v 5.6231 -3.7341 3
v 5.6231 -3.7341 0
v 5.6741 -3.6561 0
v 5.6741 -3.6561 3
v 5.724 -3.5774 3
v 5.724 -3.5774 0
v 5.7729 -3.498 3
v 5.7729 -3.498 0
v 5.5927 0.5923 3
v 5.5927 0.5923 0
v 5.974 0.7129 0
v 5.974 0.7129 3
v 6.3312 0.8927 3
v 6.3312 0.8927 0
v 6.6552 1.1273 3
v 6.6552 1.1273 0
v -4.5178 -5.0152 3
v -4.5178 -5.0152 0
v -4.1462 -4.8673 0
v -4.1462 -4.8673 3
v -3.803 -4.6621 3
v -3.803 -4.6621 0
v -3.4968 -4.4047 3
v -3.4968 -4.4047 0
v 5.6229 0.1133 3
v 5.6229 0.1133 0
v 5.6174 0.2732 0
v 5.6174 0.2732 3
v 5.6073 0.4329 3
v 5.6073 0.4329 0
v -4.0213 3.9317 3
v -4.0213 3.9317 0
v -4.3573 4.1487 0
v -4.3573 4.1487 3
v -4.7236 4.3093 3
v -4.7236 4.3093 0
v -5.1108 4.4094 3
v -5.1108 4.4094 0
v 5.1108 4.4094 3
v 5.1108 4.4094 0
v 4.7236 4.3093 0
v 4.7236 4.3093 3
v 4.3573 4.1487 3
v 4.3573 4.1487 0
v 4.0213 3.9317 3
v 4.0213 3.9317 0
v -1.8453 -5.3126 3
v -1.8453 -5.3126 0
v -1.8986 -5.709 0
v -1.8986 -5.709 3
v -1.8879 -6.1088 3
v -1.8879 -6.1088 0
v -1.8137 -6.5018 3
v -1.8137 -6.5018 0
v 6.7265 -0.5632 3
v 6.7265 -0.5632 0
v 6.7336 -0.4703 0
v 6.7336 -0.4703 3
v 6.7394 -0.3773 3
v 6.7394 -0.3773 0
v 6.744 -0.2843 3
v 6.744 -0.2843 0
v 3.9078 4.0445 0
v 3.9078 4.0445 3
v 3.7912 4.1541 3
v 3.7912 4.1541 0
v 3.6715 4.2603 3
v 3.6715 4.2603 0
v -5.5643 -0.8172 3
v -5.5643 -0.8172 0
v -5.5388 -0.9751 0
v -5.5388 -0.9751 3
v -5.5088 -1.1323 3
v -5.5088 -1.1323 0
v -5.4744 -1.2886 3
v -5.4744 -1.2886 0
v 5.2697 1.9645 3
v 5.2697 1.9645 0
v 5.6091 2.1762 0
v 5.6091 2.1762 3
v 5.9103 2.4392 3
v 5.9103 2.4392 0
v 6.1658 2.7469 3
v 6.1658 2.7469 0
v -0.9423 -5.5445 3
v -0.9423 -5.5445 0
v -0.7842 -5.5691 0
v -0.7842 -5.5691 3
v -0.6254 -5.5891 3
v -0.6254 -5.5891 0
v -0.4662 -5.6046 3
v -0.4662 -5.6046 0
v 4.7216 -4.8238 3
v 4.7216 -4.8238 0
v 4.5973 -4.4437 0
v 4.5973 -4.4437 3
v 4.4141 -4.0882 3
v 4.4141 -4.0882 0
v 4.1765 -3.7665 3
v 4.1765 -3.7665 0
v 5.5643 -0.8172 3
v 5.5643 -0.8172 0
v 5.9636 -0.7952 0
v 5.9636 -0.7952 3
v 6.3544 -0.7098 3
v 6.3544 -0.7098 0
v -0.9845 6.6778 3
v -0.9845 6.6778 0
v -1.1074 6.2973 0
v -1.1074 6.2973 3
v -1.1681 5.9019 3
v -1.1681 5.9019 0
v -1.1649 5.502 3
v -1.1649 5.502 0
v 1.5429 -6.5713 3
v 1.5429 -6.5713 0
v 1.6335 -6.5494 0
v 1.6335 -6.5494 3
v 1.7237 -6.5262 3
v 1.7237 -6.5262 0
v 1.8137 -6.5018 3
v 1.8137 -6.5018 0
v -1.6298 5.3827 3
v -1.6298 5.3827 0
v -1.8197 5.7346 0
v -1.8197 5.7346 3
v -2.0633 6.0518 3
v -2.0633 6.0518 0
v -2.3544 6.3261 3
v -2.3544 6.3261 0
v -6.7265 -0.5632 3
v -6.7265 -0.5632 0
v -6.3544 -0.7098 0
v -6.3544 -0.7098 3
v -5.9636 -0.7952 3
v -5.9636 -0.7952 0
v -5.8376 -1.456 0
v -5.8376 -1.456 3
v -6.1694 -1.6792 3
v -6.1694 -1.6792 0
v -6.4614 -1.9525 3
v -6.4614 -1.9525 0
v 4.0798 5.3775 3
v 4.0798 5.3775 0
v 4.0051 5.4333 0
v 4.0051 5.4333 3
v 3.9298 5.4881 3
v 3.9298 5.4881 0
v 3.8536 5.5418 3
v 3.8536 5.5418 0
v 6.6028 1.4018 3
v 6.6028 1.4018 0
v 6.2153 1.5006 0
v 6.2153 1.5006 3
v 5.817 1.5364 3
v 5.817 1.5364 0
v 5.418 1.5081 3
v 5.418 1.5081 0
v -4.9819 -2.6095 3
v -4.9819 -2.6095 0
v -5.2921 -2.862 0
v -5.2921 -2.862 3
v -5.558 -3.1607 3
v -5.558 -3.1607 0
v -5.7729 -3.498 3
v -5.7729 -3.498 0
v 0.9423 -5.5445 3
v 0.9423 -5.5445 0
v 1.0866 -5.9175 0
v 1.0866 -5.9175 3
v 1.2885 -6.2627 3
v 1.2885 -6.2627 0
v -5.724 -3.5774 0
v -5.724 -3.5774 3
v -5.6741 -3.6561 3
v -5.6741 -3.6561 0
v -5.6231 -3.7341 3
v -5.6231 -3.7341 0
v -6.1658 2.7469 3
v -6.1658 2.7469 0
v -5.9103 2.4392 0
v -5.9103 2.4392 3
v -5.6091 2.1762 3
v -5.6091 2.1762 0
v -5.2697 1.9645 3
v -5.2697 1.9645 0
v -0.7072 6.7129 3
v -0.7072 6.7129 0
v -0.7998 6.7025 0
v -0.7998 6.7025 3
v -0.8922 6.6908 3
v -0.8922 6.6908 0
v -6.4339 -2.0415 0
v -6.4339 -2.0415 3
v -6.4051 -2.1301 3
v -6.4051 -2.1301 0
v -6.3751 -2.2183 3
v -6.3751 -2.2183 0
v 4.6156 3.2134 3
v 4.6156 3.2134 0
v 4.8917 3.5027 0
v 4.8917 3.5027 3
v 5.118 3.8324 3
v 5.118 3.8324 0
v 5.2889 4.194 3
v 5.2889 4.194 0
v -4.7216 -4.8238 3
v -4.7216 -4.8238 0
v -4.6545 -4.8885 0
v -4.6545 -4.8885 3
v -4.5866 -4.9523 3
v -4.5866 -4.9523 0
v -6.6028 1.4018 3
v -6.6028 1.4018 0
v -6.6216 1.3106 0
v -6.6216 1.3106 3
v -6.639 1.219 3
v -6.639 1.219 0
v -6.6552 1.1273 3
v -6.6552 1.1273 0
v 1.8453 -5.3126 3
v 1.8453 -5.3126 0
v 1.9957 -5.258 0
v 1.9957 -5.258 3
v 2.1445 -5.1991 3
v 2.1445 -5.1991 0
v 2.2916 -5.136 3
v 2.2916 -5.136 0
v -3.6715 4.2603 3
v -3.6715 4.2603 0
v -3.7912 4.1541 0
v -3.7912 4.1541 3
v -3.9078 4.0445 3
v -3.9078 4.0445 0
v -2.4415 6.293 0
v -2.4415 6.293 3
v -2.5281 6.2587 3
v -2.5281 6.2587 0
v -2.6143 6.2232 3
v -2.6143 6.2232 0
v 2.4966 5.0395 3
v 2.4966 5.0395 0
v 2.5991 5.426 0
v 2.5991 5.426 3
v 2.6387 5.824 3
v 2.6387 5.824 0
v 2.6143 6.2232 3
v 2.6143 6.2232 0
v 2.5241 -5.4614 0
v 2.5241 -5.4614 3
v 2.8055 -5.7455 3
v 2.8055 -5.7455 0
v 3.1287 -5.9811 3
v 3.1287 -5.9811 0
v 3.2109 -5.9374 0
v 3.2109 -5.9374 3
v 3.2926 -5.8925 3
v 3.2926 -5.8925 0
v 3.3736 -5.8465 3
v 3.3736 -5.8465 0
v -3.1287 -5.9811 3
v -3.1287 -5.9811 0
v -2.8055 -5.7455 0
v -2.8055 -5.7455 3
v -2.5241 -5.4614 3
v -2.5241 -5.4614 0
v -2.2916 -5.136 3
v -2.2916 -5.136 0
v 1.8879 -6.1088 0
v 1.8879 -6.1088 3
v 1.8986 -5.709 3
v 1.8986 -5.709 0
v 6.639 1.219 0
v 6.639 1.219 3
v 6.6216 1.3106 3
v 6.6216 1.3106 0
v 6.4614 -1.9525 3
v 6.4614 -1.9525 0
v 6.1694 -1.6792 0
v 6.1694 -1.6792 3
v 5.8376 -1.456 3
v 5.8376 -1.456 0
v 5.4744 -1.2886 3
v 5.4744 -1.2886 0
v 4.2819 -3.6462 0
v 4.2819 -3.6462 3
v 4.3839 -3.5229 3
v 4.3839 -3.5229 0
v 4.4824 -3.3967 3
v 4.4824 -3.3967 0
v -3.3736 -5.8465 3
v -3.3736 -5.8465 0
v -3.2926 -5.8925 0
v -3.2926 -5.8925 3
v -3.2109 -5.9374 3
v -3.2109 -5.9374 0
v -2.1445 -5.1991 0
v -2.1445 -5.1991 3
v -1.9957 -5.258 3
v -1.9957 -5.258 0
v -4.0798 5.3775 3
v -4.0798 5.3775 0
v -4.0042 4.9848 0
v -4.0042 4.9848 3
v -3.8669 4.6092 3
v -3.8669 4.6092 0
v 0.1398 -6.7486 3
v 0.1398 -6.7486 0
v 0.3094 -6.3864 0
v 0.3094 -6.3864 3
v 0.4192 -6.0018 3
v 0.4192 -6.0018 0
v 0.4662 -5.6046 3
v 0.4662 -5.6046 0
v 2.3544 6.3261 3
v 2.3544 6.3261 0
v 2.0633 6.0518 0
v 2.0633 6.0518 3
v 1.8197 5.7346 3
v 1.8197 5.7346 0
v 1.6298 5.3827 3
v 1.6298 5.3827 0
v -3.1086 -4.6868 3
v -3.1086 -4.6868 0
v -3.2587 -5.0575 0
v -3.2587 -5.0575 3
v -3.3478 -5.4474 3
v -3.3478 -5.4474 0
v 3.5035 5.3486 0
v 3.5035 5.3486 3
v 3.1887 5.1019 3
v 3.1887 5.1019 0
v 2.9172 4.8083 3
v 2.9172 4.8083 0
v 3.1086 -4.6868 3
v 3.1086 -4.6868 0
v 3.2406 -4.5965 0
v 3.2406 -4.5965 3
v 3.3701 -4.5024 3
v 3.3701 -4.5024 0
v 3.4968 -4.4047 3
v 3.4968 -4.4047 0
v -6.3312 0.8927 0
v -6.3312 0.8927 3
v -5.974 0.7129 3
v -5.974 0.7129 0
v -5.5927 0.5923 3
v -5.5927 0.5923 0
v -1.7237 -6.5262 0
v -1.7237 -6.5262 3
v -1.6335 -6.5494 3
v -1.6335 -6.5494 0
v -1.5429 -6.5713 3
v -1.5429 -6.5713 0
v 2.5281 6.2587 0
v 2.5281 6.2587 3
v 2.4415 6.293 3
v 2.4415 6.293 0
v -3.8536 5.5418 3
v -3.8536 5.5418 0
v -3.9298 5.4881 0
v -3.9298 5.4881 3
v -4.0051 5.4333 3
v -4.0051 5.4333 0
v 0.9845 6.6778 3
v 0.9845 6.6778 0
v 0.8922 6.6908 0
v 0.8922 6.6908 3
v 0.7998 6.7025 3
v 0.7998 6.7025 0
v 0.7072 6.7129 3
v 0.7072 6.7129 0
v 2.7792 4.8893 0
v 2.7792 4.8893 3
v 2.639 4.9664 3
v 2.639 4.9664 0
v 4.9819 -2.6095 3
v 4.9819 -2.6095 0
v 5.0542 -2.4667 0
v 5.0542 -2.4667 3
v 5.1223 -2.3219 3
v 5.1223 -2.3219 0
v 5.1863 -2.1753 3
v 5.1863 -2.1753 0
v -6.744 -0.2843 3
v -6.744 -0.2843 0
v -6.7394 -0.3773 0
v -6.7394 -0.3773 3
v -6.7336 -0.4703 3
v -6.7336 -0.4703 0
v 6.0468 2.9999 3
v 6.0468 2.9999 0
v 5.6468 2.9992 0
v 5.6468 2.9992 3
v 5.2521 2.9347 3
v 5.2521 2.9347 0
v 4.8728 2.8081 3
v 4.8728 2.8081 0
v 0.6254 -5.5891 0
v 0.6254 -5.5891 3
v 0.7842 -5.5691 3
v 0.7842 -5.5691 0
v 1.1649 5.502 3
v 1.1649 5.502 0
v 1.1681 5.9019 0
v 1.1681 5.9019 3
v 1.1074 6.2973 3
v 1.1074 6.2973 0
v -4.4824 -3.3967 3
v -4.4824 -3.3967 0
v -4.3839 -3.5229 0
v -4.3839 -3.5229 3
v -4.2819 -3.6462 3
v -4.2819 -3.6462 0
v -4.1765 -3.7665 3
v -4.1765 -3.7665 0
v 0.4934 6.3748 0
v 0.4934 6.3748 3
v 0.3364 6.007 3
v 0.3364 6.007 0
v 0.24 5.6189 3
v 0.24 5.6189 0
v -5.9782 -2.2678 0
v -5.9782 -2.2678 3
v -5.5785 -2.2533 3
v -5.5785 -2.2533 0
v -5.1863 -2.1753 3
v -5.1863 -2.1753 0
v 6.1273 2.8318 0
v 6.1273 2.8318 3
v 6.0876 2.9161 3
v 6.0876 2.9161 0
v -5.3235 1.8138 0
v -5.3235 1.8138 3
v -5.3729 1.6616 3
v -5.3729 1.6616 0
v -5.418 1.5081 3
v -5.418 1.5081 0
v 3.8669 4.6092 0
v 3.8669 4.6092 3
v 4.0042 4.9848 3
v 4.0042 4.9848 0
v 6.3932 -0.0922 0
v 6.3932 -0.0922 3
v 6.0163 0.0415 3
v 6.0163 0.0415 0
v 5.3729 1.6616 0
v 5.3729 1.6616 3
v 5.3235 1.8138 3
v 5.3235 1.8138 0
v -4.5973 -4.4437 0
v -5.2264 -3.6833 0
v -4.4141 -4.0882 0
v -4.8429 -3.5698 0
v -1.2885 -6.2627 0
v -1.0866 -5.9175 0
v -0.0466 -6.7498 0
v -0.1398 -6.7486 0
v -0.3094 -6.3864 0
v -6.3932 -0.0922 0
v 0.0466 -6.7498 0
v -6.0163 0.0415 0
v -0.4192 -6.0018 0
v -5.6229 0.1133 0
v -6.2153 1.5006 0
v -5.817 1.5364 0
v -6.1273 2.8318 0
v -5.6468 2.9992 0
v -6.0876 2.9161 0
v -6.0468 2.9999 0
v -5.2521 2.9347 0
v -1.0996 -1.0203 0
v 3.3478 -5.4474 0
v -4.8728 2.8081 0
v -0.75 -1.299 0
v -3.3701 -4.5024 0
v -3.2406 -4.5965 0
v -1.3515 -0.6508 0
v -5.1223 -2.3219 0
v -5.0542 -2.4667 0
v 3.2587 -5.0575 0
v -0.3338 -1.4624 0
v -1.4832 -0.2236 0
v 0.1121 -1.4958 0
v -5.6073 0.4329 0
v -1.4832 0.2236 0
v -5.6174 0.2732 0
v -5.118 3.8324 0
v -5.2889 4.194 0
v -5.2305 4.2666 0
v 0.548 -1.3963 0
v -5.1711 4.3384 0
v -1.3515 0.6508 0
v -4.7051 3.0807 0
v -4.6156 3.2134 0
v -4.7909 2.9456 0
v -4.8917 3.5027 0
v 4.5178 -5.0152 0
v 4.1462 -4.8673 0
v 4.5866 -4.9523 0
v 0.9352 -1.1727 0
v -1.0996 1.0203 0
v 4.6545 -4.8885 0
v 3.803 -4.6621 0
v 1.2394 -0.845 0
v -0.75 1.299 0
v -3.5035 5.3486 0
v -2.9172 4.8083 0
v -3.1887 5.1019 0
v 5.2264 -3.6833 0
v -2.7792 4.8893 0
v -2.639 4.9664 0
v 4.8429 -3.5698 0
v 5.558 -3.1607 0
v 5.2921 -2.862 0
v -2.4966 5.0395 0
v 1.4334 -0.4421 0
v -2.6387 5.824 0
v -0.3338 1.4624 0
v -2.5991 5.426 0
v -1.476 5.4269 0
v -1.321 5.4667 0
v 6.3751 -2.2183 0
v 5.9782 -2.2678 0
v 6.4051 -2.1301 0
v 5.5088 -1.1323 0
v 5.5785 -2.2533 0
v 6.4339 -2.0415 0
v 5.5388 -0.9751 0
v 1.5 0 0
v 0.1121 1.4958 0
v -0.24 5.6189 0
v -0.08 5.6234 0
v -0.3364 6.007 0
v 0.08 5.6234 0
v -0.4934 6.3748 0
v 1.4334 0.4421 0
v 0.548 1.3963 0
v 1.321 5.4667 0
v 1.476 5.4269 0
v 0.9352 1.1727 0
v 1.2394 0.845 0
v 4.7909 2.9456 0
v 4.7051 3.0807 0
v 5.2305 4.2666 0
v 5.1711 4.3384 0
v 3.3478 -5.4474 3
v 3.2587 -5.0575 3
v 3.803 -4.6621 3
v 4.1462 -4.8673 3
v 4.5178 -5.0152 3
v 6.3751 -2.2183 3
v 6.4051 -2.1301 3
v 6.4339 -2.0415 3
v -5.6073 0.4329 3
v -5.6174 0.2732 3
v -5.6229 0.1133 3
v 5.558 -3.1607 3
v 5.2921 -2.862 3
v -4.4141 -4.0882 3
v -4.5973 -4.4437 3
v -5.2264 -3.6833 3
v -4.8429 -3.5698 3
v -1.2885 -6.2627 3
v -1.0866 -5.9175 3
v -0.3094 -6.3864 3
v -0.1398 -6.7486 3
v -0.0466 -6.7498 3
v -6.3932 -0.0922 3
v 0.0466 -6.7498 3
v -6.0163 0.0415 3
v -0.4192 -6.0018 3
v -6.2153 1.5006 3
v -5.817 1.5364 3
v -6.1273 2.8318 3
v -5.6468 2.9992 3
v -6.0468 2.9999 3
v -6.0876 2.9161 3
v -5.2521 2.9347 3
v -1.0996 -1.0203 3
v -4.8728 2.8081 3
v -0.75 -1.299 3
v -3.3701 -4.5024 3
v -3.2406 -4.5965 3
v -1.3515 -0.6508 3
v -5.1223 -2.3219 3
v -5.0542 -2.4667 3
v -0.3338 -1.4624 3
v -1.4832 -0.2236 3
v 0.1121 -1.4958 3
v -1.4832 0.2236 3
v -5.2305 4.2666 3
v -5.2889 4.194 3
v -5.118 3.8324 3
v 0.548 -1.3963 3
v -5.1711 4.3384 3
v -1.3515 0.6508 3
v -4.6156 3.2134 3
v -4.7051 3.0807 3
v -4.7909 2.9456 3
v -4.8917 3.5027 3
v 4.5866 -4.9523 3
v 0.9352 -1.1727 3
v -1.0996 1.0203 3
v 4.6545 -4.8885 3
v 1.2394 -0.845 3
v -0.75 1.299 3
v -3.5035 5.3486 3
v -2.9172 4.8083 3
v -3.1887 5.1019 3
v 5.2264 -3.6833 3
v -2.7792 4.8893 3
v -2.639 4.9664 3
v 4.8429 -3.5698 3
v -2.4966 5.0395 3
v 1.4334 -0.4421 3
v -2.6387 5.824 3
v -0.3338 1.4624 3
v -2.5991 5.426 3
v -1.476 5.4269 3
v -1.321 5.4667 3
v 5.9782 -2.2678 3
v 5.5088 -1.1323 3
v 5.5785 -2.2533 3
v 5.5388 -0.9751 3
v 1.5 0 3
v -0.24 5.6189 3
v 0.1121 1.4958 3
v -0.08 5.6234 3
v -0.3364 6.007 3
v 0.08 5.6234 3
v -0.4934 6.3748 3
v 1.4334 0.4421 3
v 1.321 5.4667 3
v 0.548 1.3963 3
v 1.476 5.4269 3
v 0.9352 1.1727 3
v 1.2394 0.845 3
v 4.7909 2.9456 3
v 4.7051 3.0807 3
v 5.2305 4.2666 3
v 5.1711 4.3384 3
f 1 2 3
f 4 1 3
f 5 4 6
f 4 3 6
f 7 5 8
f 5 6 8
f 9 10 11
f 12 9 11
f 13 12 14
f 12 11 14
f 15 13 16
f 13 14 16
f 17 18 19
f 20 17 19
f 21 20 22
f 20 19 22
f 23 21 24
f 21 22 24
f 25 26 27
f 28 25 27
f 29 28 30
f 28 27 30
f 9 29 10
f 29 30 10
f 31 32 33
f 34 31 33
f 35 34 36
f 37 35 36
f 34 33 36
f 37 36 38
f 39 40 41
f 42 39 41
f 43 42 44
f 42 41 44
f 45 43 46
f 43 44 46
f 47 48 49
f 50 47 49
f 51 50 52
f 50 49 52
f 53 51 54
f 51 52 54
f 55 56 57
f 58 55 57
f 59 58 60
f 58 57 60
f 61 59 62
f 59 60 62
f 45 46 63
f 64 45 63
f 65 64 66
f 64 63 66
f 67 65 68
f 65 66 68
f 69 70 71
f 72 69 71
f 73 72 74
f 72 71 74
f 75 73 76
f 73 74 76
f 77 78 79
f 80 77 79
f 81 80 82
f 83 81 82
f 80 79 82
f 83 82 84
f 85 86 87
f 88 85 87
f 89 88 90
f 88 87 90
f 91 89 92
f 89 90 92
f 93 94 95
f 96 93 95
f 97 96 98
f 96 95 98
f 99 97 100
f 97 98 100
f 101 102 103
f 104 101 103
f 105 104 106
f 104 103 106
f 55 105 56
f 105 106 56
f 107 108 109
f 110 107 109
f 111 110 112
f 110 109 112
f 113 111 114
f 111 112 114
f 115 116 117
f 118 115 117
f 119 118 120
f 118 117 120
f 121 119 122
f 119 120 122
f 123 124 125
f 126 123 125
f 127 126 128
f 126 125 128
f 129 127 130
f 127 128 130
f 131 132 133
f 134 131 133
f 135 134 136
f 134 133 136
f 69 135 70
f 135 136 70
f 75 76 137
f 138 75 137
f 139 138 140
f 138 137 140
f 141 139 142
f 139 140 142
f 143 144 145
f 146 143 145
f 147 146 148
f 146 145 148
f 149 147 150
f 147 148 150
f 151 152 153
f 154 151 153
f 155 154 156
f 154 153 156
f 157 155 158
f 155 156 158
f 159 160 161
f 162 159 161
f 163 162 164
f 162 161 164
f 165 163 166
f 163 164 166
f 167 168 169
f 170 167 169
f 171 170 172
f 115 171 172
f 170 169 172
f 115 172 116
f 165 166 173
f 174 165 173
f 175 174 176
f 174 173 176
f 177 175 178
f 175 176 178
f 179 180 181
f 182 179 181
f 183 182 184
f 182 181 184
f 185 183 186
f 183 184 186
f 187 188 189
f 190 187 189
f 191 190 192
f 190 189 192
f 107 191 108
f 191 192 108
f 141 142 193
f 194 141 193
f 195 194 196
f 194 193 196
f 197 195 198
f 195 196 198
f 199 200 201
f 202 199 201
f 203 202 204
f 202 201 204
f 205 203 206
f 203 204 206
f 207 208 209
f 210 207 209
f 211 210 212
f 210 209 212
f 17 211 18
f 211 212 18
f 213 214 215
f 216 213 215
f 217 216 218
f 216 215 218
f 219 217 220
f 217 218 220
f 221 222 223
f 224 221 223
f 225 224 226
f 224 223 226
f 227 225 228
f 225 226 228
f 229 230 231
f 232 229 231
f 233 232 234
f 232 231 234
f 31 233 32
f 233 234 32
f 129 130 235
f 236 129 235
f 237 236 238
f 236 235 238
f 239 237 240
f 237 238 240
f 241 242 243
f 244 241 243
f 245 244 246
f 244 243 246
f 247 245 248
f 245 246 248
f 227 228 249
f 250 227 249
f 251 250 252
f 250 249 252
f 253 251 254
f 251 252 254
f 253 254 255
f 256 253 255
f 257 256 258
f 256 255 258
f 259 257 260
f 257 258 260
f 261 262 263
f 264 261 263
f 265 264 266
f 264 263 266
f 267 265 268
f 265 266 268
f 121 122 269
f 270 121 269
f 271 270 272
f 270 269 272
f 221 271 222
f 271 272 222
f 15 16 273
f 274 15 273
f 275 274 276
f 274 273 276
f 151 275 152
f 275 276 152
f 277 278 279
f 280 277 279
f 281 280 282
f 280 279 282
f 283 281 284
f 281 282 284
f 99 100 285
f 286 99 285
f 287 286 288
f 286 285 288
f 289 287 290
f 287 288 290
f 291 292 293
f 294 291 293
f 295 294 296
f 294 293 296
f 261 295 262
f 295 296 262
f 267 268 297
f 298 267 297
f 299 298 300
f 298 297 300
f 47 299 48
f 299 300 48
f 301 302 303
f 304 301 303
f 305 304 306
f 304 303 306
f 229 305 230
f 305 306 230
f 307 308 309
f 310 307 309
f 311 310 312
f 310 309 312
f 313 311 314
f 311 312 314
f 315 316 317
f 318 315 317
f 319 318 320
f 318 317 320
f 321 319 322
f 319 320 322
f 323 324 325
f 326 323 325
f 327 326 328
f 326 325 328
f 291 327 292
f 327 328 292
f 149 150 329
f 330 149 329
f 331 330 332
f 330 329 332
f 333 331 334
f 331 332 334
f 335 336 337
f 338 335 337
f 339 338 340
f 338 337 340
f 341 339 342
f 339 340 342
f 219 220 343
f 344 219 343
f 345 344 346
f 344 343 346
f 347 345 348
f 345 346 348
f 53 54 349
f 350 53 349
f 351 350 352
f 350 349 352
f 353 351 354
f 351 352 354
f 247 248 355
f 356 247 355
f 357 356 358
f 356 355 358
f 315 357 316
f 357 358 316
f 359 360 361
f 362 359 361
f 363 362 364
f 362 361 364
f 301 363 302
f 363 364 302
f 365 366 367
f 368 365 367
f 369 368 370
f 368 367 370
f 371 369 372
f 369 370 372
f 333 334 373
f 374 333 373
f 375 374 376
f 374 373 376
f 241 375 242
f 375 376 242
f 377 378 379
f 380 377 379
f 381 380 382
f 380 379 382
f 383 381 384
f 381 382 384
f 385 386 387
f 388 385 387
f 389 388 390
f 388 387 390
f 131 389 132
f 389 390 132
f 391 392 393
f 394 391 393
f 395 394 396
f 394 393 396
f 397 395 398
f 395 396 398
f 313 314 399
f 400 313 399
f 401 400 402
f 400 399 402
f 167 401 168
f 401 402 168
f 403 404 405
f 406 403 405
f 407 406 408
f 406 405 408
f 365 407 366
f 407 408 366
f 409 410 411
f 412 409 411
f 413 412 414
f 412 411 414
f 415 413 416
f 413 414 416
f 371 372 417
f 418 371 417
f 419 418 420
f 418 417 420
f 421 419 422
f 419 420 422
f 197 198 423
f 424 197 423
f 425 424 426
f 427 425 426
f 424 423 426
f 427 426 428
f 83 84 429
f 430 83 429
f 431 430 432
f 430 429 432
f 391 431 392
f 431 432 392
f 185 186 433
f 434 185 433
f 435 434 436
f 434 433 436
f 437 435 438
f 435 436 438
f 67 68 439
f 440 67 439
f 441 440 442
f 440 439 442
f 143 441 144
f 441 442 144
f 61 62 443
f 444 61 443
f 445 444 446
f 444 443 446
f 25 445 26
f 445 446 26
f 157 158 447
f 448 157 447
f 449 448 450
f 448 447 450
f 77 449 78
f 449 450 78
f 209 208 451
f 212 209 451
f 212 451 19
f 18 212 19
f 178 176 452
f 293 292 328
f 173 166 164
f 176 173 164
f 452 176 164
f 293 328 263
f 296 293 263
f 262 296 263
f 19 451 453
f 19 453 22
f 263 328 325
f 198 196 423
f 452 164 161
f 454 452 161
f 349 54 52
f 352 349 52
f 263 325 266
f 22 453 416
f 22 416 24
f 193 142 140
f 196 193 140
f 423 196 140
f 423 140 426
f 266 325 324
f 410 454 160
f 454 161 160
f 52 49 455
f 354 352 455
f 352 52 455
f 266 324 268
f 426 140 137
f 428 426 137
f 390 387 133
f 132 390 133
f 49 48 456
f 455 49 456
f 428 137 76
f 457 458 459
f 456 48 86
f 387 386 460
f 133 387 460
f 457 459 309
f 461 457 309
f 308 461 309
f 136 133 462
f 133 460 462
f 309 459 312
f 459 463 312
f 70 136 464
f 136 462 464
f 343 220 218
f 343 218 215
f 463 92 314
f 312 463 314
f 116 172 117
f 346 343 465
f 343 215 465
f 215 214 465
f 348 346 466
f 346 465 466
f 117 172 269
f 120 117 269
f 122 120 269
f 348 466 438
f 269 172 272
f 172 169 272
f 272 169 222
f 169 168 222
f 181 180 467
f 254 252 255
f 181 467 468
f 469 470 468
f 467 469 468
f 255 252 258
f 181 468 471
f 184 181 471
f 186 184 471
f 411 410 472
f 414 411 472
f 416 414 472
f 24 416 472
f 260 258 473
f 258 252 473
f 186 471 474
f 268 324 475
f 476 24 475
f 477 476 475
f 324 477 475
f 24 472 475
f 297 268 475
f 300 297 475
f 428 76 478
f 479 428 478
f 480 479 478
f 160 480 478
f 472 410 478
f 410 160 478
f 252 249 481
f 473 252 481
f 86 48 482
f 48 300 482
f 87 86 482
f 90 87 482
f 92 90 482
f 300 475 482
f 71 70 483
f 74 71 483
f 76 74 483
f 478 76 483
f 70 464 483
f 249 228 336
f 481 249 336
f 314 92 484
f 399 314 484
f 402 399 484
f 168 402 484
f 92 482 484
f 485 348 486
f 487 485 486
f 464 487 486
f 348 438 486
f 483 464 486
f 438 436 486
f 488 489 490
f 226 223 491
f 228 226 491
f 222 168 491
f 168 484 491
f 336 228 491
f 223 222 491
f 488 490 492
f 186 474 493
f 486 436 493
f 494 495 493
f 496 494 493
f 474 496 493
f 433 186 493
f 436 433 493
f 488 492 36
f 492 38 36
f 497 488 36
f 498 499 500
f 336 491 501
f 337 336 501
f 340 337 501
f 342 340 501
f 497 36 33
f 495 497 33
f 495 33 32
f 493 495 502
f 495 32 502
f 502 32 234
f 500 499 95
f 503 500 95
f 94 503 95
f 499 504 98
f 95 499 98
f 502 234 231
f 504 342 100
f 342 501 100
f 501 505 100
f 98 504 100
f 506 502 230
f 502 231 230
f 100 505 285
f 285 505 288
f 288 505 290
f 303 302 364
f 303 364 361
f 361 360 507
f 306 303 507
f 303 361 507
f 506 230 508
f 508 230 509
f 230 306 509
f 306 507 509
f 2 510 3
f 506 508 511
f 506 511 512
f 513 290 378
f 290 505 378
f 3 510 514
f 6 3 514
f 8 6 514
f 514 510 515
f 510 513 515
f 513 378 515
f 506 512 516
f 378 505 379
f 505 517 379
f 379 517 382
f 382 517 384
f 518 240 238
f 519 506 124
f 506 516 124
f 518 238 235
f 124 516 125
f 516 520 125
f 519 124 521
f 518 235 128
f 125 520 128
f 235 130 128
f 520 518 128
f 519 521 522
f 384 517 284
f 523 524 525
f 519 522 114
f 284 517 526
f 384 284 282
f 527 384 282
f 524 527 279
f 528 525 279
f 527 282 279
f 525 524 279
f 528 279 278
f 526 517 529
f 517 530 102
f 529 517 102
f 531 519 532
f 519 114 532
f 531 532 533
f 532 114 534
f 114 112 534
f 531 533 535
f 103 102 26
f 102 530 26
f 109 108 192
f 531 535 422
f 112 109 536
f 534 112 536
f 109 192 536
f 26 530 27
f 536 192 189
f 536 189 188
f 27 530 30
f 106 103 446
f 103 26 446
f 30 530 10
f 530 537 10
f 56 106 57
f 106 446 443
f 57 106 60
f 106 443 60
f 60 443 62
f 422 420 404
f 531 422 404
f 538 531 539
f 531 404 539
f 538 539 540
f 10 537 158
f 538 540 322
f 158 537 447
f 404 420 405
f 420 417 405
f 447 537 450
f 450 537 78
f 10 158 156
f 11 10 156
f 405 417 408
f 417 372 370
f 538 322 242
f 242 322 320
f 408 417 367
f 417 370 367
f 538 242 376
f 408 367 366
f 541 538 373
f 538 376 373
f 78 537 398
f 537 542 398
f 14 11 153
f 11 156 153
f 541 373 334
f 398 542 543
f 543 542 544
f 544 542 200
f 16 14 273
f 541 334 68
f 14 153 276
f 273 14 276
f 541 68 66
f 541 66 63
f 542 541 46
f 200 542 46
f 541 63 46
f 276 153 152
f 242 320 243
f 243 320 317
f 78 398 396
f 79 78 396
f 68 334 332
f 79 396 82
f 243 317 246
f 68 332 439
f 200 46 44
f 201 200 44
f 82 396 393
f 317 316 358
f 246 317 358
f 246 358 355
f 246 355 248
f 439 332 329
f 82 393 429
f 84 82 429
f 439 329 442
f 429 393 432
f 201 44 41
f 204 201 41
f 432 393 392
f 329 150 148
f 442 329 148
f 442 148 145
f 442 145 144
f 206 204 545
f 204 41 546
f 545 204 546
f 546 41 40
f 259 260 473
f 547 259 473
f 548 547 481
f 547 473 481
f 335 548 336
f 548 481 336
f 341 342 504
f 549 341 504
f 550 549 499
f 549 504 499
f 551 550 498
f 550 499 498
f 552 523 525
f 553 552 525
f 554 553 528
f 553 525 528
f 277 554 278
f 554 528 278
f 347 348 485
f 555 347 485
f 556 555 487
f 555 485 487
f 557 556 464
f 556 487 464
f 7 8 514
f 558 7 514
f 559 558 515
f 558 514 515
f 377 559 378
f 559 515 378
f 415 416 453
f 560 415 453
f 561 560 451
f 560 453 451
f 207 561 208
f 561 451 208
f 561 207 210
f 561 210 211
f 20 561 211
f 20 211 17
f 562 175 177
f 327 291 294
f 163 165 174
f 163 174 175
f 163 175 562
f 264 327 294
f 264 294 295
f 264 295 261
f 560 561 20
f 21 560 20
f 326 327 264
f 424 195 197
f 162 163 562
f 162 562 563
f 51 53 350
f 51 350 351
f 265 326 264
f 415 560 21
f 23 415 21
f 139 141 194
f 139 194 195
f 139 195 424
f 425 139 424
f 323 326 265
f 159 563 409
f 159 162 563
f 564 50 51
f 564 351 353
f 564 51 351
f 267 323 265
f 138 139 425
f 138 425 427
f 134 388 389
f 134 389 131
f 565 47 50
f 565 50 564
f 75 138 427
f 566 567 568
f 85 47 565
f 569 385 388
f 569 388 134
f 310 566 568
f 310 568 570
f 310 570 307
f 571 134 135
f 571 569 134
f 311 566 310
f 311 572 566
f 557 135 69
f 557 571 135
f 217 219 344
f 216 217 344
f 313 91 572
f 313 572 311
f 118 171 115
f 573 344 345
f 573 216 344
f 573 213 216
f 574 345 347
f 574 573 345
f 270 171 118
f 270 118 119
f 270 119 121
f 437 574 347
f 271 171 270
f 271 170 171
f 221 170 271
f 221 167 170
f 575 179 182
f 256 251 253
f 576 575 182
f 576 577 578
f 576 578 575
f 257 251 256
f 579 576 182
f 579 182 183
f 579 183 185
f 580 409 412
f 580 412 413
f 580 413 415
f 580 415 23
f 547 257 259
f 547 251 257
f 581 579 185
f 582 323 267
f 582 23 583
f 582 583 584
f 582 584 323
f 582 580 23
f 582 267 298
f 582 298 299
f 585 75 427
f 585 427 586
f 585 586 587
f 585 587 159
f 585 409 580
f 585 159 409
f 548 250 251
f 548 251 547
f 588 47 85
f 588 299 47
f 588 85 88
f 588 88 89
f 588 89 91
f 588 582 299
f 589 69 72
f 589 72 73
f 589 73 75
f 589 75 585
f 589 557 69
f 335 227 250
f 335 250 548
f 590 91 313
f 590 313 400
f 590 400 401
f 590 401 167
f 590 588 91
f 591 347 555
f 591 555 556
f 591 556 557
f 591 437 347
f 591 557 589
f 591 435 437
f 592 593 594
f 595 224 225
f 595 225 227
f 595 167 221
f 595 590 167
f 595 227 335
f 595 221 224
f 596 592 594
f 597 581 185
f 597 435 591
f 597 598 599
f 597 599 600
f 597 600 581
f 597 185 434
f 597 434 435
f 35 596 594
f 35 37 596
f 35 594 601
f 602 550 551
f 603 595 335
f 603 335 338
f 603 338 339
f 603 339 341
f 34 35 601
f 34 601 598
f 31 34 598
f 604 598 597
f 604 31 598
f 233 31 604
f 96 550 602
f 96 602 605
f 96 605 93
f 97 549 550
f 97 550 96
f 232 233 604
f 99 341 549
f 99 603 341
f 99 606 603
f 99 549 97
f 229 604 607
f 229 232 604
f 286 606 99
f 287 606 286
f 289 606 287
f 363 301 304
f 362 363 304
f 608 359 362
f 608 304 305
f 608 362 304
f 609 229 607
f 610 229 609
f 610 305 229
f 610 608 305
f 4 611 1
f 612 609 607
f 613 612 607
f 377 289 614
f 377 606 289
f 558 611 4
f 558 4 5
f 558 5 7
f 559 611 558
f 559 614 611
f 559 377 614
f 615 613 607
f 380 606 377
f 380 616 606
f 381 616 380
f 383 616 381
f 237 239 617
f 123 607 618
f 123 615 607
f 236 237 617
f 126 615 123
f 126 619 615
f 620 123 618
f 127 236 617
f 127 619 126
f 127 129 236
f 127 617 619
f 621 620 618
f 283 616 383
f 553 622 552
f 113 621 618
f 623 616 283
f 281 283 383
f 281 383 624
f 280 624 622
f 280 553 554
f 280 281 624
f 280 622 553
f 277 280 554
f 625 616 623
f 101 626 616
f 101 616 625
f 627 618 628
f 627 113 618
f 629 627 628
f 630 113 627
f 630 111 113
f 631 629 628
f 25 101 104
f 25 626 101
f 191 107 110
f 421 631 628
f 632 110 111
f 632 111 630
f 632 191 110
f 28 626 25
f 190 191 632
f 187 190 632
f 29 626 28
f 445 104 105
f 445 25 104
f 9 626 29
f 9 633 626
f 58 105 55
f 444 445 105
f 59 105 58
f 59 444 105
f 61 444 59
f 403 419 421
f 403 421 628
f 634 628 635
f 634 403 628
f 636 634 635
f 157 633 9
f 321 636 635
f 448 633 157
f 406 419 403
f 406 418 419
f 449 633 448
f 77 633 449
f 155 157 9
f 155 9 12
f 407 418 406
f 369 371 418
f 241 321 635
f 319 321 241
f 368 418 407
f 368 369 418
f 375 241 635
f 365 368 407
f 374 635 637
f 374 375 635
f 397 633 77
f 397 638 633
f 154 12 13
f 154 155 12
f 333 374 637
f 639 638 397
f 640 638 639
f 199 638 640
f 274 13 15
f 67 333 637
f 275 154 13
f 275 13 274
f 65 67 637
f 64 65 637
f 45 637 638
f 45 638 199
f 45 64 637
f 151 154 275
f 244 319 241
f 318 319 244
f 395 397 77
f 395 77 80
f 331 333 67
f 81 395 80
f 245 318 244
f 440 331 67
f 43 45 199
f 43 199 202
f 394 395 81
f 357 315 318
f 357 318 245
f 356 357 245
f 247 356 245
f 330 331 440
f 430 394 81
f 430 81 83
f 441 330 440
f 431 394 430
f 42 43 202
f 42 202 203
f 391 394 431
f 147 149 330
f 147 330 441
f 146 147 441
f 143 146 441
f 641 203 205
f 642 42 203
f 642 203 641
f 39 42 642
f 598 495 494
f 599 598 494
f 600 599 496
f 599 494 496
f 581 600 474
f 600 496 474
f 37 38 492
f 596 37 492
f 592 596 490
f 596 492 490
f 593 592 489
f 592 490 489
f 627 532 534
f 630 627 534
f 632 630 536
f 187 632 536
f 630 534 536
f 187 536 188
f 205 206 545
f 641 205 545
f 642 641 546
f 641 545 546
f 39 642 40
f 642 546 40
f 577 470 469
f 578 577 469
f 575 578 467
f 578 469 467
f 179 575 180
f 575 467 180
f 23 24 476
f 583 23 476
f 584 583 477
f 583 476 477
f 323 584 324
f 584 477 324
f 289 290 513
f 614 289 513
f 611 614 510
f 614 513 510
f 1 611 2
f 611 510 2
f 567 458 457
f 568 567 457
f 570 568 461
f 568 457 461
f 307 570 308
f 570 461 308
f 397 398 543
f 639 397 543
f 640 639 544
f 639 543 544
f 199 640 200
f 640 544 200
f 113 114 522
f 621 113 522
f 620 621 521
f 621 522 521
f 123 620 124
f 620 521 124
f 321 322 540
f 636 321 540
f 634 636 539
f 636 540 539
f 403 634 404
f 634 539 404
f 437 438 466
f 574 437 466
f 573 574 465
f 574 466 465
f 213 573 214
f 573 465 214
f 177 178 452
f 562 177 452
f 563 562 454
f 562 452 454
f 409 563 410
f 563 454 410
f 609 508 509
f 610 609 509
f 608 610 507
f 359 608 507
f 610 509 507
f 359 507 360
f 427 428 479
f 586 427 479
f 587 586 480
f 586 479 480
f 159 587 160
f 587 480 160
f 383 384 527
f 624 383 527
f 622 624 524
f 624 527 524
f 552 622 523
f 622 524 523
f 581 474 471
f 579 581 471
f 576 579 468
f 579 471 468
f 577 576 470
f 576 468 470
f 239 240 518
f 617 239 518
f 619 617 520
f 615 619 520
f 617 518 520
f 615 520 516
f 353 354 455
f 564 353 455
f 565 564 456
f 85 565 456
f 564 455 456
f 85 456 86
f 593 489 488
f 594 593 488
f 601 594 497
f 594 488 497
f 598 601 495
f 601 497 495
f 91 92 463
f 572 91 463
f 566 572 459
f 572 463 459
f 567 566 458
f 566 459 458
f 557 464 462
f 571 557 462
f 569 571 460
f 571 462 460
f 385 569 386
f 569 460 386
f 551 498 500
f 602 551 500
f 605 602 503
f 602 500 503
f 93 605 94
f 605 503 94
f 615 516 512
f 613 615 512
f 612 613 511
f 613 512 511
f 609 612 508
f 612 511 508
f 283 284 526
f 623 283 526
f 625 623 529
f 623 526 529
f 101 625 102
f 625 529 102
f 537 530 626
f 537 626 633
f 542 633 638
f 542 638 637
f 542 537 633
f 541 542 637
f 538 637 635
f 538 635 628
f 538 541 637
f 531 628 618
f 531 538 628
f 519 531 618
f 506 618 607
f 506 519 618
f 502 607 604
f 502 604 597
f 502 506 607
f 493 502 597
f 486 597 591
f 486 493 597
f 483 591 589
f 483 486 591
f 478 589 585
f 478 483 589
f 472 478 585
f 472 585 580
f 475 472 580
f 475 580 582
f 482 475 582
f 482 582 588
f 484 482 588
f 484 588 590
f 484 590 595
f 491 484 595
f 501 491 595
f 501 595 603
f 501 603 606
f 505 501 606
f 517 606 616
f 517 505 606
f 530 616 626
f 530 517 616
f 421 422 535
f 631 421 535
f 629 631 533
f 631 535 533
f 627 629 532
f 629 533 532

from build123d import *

# Parameters (mm, degrees)
SKETCH_1_R      = 1.5
EXTRUDE_1_DEPTH = 3


with BuildPart() as part:
    # 草图1 → 凸台-拉伸1 (new body)
    with BuildSketch(Plane.XY):
        with BuildLine():
            ThreePointArc((-6.655206862, 1.127262893), (-6.156247128, 0.795666927), (-5.592723466, 0.592300797))
            ThreePointArc((-5.592723466, 0.592300797), (-5.612902321, 0.353133882), (-5.622858145, 0.113323788))
            ThreePointArc((-5.622858145, 0.113323788), (-6.207426789, -0.017810496), (-6.744012071, -0.284255492))
            ThreePointArc((-6.744012071, -0.284255492), (-6.736680417, -0.423836007), (-6.726460182, -0.563234787))
            ThreePointArc((-6.726460182, -0.563234787), (-6.160711622, -0.760326816), (-5.564316992, -0.81716119))
            ThreePointArc((-5.564316992, -0.81716119), (-5.524383498, -1.053832513), (-5.474388197, -1.288584444))
            ThreePointArc((-5.474388197, -1.288584444), (-6.007979772, -1.560975215), (-6.461445064, -1.952492684))
            ThreePointArc((-6.461445064, -1.952492684), (-6.419631485, -2.085864712), (-6.37506527, -2.218342354))
            ThreePointArc((-6.37506527, -2.218342354), (-5.778075948, -2.26854643), (-5.186284018, -2.175277933))
            ThreePointArc((-5.186284018, -2.175277933), (-5.088747343, -2.394582736), (-4.981942305, -2.609526178))
            ThreePointArc((-4.981942305, -2.609526178), (-5.431029289, -3.006058119), (-5.772881701, -3.49804758))
            ThreePointArc((-5.772881701, -3.49804758), (-5.699213497, -3.616830866), (-5.623101562, -3.734063313))
            ThreePointArc((-5.623101562, -3.734063313), (-5.032382511, -3.634224927), (-4.482377745, -3.396713964))
            ThreePointArc((-4.482377745, -3.396713964), (-4.333366477, -3.584872518), (-4.176462656, -3.766501784))
            ThreePointArc((-4.176462656, -3.766501784), (-4.512827263, -4.262259337), (-4.721586948, -4.823807282))
            ThreePointArc((-4.721586948, -4.823807282), (-4.620692965, -4.920538235), (-4.517817702, -5.01515934))
            ThreePointArc((-4.517817702, -5.01515934), (-3.970485973, -4.771551707), (-3.496827193, -4.404721964))
            ThreePointArc((-3.496827193, -4.404721964), (-3.305704259, -4.549911576), (-3.108560498, -4.686814231))
            ThreePointArc((-3.108560498, -4.686814231), (-3.311067702, -5.250647125), (-3.373617523, -5.846469431))
            ThreePointArc((-3.373617523, -5.846469431), (-3.2518373, -5.91507009), (-3.128662741, -5.981134462))
            ThreePointArc((-3.128662741, -5.981134462), (-2.6591092, -5.609064345), (-2.291558128, -5.135965084))
            ThreePointArc((-2.291558128, -5.135965084), (-2.070332484, -5.229062957), (-1.845336051, -5.312636903))
            ThreePointArc((-1.845336051, -5.312636903), (-1.901261581, -5.909117443), (-1.813671302, -6.501776404))
            ThreePointArc((-1.813671302, -6.501776404), (-1.678656738, -6.537936338), (-1.542922393, -6.571292908))
            ThreePointArc((-1.542922393, -6.571292908), (-1.180650815, -6.094138841), (-0.942302038, -5.544496629))
            ThreePointArc((-0.942302038, -5.544496629), (-0.704874106, -5.57965308), (-0.466162354, -5.604647059))
            ThreePointArc((-0.466162354, -5.604647059), (-0.371992202, -6.196296181), (-0.139765443, -6.748552854))
            ThreePointArc((-0.139765443, -6.748552854), (0, -6.75), (0.139765443, -6.748552854))
            ThreePointArc((0.139765443, -6.748552854), (0.371992202, -6.196296181), (0.466162354, -5.604647059))
            ThreePointArc((0.466162354, -5.604647059), (0.704874106, -5.57965308), (0.942302038, -5.544496629))
            ThreePointArc((0.942302038, -5.544496629), (1.180650815, -6.094138841), (1.542922393, -6.571292908))
            ThreePointArc((1.542922393, -6.571292908), (1.678656738, -6.537936338), (1.813671302, -6.501776404))
            ThreePointArc((1.813671302, -6.501776404), (1.901261581, -5.909117443), (1.845336051, -5.312636903))
            ThreePointArc((1.845336051, -5.312636903), (2.070332484, -5.229062957), (2.291558128, -5.135965084))
            ThreePointArc((2.291558128, -5.135965084), (2.6591092, -5.609064345), (3.128662741, -5.981134462))
            ThreePointArc((3.128662741, -5.981134462), (3.2518373, -5.91507009), (3.373617523, -5.846469431))
            ThreePointArc((3.373617523, -5.846469431), (3.311067702, -5.250647125), (3.108560498, -4.686814231))
            ThreePointArc((3.108560498, -4.686814231), (3.305704259, -4.549911576), (3.496827193, -4.404721964))
            ThreePointArc((3.496827193, -4.404721964), (3.970485973, -4.771551707), (4.517817702, -5.01515934))
            ThreePointArc((4.517817702, -5.01515934), (4.620692965, -4.920538235), (4.721586948, -4.823807282))
            ThreePointArc((4.721586948, -4.823807282), (4.512827263, -4.262259337), (4.176462656, -3.766501784))
            ThreePointArc((4.176462656, -3.766501784), (4.333366477, -3.584872518), (4.482377745, -3.396713964))
            ThreePointArc((4.482377745, -3.396713964), (5.032382511, -3.634224927), (5.623101562, -3.734063313))
            ThreePointArc((5.623101562, -3.734063313), (5.699213497, -3.616830866), (5.772881701, -3.49804758))
            ThreePointArc((5.772881701, -3.49804758), (5.431029289, -3.006058119), (4.981942305, -2.609526178))
            ThreePointArc((4.981942305, -2.609526178), (5.088747343, -2.394582736), (5.186284018, -2.175277933))
            ThreePointArc((5.186284018, -2.175277933), (5.778075948, -2.26854643), (6.37506527, -2.218342354))
            ThreePointArc((6.37506527, -2.218342354), (6.419631485, -2.085864712), (6.461445064, -1.952492684))
            ThreePointArc((6.461445064, -1.952492684), (6.007979772, -1.560975215), (5.474388197, -1.288584444))
            ThreePointArc((5.474388197, -1.288584444), (5.524383498, -1.053832513), (5.564316992, -0.81716119))
            ThreePointArc((5.564316992, -0.81716119), (6.160711622, -0.760326816), (6.726460182, -0.563234787))
            ThreePointArc((6.726460182, -0.563234787), (6.736680417, -0.423836007), (6.744012071, -0.284255492))
            ThreePointArc((6.744012071, -0.284255492), (6.207426789, -0.017810496), (5.622858145, 0.113323788))
            ThreePointArc((5.622858145, 0.113323788), (5.612902321, 0.353133882), (5.592723466, 0.592300797))
            ThreePointArc((5.592723466, 0.592300797), (6.156247128, 0.795666927), (6.655206862, 1.127262893))
            ThreePointArc((6.655206862, 1.127262893), (6.630438942, 1.264823873), (6.602827997, 1.401842518))
            ThreePointArc((6.602827997, 1.401842518), (6.016838352, 1.526473321), (5.418023237, 1.508111471))
            ThreePointArc((5.418023237, 1.508111471), (5.348741848, 1.737911576), (5.269718556, 1.964546346))
            ThreePointArc((5.269718556, 1.964546346), (5.764962986, 2.301665991), (6.165782418, 2.7469305))
            ThreePointArc((6.165782418, 2.7469305), (6.107582604, 2.874010218), (6.046763956, 2.999857607))
            ThreePointArc((6.046763956, 2.999857607), (5.448189833, 2.974843206), (4.872754002, 2.808138963))
            ThreePointArc((4.872754002, 2.808138963), (4.748500253, 3.013489895), (4.615597848, 3.213352223))
            ThreePointArc((4.615597848, 3.213352223), (5.011445017, 3.663042916), (5.28893919, 4.193998361))
            ThreePointArc((5.28893919, 4.193998361), (5.200964389, 4.302611931), (5.110759497, 4.40938061))
            ThreePointArc((5.110759497, 4.40938061), (4.53721151, 4.236292751), (4.021311713, 3.931720757))
            ThreePointArc((4.021311713, 3.931720757), (3.849892924, 4.099719561), (3.671462152, 4.260251362))
            ThreePointArc((3.671462152, 4.260251362), (3.943039527, 4.794257382), (4.07977246, 5.37754188))
            ThreePointArc((4.07977246, 5.37754188), (3.967550453, 5.460864712), (3.853627223, 5.541846012))
            ThreePointArc((3.853627223, 5.541846012), (3.341143501, 5.231560443), (2.917195619, 4.808258075))
            ThreePointArc((2.917195619, 4.808258075), (2.709382663, 4.928348769), (2.496634987, 5.039463239))
            ThreePointArc((2.496634987, 5.039463239), (2.626878362, 5.624231026), (2.614258623, 6.223194666))
            ThreePointArc((2.614258623, 6.223194666), (2.484840731, 6.27599128), (2.354357378, 6.326096848))
            ThreePointArc((2.354357378, 6.326096848), (1.935139158, 5.898109951), (1.629781396, 5.382674856))
            ThreePointArc((1.629781396, 5.382674856), (1.398631925, 5.447311698), (1.164935063, 5.502027108))
            ThreePointArc((1.164935063, 5.502027108), (1.145660769, 6.100813549), (0.984481302, 6.677821244))
            ThreePointArc((0.984481302, 6.677821244), (0.845999327, 6.696774234), (0.7071546, 6.712855754))
            ThreePointArc((0.7071546, 6.712855754), (0.407542904, 6.19405952), (0.239962014, 5.618878378))
            ThreePointArc((0.239962014, 5.618878378), (0, 5.624), (-0.239962014, 5.618878378))
            ThreePointArc((-0.239962014, 5.618878378), (-0.407542904, 6.19405952), (-0.7071546, 6.712855754))
            ThreePointArc((-0.7071546, 6.712855754), (-0.845999327, 6.696774234), (-0.984481302, 6.677821244))
            ThreePointArc((-0.984481302, 6.677821244), (-1.145660769, 6.100813549), (-1.164935063, 5.502027108))
            ThreePointArc((-1.164935063, 5.502027108), (-1.398631925, 5.447311698), (-1.629781396, 5.382674855))
            ThreePointArc((-1.629781396, 5.382674855), (-1.935139158, 5.898109951), (-2.354357378, 6.326096848))
            ThreePointArc((-2.354357378, 6.326096848), (-2.484840731, 6.27599128), (-2.614258623, 6.223194666))
            ThreePointArc((-2.614258623, 6.223194666), (-2.626878362, 5.624231026), (-2.496634987, 5.039463239))
            ThreePointArc((-2.496634987, 5.039463239), (-2.709382663, 4.928348769), (-2.917195619, 4.808258075))
            ThreePointArc((-2.917195619, 4.808258075), (-3.341143501, 5.231560443), (-3.853627223, 5.541846012))
            ThreePointArc((-3.853627223, 5.541846012), (-3.967550453, 5.460864712), (-4.07977246, 5.37754188))
            ThreePointArc((-4.07977246, 5.37754188), (-3.943039527, 4.794257382), (-3.671462152, 4.260251362))
            ThreePointArc((-3.671462152, 4.260251362), (-3.849892924, 4.099719561), (-4.021311713, 3.931720757))
            ThreePointArc((-4.021311713, 3.931720757), (-4.53721151, 4.236292751), (-5.110759497, 4.40938061))
            ThreePointArc((-5.110759497, 4.40938061), (-5.200964389, 4.302611931), (-5.28893919, 4.193998361))
            ThreePointArc((-5.28893919, 4.193998361), (-5.011445017, 3.663042916), (-4.615597848, 3.213352223))
            ThreePointArc((-4.615597848, 3.213352223), (-4.748500253, 3.013489895), (-4.872754002, 2.808138963))
            ThreePointArc((-4.872754002, 2.808138963), (-5.448189833, 2.974843206), (-6.046763956, 2.999857607))
            ThreePointArc((-6.046763956, 2.999857607), (-6.107582604, 2.874010218), (-6.165782418, 2.7469305))
            ThreePointArc((-6.165782418, 2.7469305), (-5.764962986, 2.301665991), (-5.269718556, 1.964546346))
            ThreePointArc((-5.269718556, 1.964546346), (-5.348741848, 1.737911576), (-5.418023237, 1.508111471))
            ThreePointArc((-5.418023237, 1.508111471), (-6.016838352, 1.526473321), (-6.602827997, 1.401842518))
            ThreePointArc((-6.602827997, 1.401842518), (-6.630438942, 1.264823873), (-6.655206862, 1.127262893))
        make_face()
        Circle(SKETCH_1_R, mode=Mode.SUBTRACT)
    extrude(amount=EXTRUDE_1_DEPTH)


solid = part.part
